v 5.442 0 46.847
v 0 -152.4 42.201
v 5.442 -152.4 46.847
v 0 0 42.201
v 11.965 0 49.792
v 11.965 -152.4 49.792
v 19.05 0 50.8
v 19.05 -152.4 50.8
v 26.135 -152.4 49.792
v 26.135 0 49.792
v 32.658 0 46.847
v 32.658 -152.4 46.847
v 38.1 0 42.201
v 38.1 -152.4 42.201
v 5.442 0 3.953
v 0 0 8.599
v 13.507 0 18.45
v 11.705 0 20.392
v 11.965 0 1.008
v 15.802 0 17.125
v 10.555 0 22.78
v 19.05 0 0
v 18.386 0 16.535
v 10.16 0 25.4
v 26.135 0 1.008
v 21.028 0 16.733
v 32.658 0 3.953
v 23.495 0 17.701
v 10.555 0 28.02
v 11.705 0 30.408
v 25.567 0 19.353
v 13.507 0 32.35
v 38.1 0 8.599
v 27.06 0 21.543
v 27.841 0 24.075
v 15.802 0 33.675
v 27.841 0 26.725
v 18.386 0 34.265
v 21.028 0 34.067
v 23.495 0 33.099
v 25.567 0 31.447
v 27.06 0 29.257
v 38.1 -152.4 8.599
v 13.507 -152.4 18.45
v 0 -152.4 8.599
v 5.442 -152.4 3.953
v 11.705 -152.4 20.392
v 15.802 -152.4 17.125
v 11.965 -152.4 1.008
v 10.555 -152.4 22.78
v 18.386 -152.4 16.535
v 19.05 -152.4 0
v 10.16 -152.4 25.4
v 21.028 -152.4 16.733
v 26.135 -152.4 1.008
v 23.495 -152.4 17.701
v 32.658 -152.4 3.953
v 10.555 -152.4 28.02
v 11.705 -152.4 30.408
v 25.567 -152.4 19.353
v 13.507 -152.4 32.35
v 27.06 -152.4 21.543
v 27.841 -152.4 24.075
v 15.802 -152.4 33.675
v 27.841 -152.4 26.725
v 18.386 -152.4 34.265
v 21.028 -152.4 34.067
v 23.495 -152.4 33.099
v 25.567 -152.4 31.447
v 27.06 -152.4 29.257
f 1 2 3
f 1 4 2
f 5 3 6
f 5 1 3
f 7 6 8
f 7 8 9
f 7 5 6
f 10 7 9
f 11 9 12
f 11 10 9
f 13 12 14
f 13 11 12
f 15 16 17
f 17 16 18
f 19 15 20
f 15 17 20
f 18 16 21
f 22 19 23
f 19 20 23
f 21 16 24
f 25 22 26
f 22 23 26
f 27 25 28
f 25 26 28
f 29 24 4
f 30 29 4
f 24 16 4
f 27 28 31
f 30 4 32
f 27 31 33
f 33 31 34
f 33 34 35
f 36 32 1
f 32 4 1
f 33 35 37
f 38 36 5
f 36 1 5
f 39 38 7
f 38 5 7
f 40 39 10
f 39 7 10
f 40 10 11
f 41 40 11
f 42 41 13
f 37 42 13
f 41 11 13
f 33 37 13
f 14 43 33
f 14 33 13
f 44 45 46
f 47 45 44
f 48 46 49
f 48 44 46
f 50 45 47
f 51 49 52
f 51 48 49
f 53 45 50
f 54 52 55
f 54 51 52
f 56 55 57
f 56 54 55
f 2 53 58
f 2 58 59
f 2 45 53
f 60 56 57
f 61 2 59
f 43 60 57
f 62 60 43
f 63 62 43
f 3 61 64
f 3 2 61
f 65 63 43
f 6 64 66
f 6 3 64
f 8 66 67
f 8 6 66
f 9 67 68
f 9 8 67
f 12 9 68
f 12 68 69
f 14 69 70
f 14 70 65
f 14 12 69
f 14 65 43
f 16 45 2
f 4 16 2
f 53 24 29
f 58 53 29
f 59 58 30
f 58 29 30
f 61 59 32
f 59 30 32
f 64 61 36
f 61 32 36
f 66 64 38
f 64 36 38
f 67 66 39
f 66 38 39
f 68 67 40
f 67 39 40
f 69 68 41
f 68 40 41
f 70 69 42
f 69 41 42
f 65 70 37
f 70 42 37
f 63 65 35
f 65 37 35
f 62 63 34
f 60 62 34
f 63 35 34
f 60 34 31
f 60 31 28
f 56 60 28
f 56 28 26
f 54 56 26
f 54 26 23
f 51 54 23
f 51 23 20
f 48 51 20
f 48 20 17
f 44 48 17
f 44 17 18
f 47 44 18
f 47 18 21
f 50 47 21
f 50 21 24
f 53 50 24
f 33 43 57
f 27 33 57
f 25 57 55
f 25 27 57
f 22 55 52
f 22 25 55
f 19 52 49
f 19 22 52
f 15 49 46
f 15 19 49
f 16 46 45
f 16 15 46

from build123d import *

# Parameters (mm, degrees)
F0_W     = 38.1
F0_H     = 50.8
F1_DEPTH = 152.4
F2_R     = 8.89
F3_DEPTH = 152.401
F5_W     = 152.4
F5_H     = 28.410043


with BuildPart() as f1:
    # F0 (on Front) → F1 (new body)
    with BuildSketch(Plane.XZ):
        with Locations((19.05, 25.4)):
            Rectangle(F0_W, F0_H)
    extrude(amount=F1_DEPTH)

    # F2 (on face) → F3 (cut, through all)
    with BuildSketch(Plane(origin=(0, 0, 0), x_dir=(-1, 0, 0), z_dir=(0, 1, 0))):
        with Locations((-19.05, 25.4)):
            Circle(F2_R)
    extrude(amount=-F3_DEPTH, mode=Mode.SUBTRACT)

    # F5 (on offset) → F6 (revolve, cut)
    with BuildSketch(Plane.YZ.offset(19.05)):
        with Locations((-76.2, 65.005021)):
            Rectangle(F5_W, F5_H)
    revolve(axis=Axis((19.05, -76.2, 25.4), (0, 1, 0)), mode=Mode.SUBTRACT)


solid = f1.part
